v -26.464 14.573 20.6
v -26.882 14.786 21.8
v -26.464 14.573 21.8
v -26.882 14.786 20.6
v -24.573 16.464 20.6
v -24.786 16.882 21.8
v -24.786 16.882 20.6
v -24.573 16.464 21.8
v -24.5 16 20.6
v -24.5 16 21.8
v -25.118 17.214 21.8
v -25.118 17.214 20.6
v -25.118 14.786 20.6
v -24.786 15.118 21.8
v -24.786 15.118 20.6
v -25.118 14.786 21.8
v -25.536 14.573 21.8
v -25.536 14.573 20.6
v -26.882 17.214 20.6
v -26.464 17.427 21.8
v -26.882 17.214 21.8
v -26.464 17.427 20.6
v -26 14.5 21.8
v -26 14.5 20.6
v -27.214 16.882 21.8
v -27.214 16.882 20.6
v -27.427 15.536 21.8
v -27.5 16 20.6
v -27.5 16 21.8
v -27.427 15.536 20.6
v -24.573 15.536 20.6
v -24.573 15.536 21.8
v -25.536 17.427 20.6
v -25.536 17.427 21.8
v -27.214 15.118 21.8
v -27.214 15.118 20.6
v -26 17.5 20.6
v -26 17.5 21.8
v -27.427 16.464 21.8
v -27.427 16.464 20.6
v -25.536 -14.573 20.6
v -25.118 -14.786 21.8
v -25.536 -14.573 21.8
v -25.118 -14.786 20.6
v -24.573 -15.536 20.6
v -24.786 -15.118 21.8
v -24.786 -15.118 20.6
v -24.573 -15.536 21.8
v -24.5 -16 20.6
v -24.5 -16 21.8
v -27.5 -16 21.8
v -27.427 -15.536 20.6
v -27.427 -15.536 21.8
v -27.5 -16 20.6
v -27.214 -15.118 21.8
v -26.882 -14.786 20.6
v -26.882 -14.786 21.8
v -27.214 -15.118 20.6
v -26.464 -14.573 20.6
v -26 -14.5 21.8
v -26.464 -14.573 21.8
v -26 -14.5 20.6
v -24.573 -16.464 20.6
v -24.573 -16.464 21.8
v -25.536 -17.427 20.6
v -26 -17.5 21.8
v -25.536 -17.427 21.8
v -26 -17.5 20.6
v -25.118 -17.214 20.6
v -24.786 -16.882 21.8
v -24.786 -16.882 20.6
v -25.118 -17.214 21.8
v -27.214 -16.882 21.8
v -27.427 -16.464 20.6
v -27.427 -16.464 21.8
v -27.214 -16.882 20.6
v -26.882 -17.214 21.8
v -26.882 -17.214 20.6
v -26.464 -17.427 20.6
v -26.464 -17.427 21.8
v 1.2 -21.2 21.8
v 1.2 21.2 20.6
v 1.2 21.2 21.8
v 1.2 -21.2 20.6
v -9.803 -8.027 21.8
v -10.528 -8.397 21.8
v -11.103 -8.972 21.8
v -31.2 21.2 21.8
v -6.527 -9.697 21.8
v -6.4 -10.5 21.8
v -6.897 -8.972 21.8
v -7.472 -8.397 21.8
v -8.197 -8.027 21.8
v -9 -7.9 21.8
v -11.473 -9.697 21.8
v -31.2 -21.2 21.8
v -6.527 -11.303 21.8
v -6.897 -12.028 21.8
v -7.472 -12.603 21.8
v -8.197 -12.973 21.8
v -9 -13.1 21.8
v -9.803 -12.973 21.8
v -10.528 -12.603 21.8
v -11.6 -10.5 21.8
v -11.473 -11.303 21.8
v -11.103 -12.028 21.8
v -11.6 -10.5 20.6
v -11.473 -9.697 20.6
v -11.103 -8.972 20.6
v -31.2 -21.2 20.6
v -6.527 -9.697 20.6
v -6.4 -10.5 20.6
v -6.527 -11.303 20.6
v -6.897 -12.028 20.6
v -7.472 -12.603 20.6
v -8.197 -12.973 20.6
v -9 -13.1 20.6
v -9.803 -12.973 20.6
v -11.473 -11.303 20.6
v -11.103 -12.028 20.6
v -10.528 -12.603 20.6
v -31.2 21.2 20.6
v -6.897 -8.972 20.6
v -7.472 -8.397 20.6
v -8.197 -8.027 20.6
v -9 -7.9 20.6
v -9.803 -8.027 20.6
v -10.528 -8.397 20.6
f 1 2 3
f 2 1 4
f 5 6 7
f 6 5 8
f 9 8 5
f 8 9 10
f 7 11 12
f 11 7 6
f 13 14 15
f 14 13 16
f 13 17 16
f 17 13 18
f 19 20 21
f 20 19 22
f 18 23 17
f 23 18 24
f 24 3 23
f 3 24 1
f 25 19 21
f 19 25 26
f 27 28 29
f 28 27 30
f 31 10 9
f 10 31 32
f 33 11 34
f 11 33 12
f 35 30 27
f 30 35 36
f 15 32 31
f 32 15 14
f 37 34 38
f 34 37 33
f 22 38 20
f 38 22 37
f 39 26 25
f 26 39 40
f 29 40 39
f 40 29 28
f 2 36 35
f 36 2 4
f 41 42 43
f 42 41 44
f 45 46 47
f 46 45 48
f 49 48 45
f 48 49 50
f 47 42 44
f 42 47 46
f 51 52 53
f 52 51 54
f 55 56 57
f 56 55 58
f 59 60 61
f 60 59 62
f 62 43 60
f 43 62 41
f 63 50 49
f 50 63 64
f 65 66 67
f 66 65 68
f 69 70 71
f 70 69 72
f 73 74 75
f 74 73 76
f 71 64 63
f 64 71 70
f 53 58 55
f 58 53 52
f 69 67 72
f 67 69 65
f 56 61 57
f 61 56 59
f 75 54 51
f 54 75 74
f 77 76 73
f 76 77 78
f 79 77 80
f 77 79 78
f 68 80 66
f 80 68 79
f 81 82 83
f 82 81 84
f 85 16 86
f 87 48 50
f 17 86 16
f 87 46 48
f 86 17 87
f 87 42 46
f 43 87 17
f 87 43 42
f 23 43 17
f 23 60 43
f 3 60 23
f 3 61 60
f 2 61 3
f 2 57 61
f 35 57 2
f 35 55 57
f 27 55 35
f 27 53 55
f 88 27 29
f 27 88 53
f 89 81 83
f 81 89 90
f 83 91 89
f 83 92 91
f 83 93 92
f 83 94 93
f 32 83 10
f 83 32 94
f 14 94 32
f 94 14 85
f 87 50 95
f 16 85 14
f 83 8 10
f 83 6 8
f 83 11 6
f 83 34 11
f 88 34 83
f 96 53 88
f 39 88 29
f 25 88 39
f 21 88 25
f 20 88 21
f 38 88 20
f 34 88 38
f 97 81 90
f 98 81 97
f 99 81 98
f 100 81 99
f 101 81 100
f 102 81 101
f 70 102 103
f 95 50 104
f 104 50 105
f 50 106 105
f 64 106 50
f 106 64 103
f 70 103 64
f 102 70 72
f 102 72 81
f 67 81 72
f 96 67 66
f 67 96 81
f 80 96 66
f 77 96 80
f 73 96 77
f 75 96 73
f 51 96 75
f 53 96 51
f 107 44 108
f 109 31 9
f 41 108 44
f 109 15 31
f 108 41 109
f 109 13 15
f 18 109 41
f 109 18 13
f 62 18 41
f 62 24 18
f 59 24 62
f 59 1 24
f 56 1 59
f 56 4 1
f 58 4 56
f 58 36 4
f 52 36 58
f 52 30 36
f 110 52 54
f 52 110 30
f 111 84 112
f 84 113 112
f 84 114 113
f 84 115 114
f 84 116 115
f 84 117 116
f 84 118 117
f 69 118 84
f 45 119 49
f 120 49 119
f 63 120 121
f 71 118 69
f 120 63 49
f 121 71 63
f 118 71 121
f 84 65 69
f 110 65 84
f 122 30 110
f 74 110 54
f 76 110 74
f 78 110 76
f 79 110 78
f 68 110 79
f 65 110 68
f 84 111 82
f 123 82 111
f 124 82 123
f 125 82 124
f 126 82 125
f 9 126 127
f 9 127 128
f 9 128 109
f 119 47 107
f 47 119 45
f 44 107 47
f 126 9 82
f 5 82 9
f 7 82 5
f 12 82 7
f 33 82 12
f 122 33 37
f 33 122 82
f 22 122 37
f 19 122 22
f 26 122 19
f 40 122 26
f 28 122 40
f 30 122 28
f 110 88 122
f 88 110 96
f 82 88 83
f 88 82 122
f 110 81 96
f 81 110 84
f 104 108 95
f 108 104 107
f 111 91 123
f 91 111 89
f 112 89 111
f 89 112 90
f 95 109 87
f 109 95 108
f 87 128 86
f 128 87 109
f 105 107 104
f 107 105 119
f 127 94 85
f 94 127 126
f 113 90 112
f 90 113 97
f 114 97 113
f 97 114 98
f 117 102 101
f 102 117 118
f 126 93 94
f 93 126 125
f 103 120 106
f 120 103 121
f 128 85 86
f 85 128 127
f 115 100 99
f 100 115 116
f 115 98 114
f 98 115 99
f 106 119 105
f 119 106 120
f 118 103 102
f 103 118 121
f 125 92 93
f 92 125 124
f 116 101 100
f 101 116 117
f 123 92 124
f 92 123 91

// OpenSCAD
height = 40;
width = 40;
length = 60;
thick = 1.2;
$fn = 20;

module base()
{
    difference()
    {
        cube([length + 2*thick, width + 2*thick, height + thick], center = true);
        
        translate([0, 0, thick * 0.51])
        cube([length, width, height], center = true);
        
        translate([length/2, 0, height/2])
        cube([5, width, 2], center = true);
    }
    
    translate([-length/2 + 4, width/2 -4, height/2])
    cube([8, 8, thick], center = true);

    translate([-length/2 + 4, -width/2 +4, height/2])
    cube([8, 8, thick], center = true);

    translate([0, 8.2, 12])
    difference()
    {   
        cube([23 + 2*thick, 23 + thick, 15 + thick], center = true);
        
        translate([0, -thick * 0.51, thick * 0.51])
        {
            cube([23, 23, 15], center = true);
            
            translate([23/2, 23/2 - 3/2 - 16, thick * 0.51])
            cube([5, 3, 15], center = true);
            
            translate([-23/2, 23/2 - 3/2 - 16, thick * 0.51])
            cube([5, 3, 15], center = true);
            
            /*
            translate([0, 23/2 - 5/2 - 27, 0])
            #cube([10, 5, 10], center = true);
            
            translate([-8, 23/2 - 5/2 - 27, 0])
            #cube([8, 5, 10], center = true);
            */
        }
    }
}

module mobile()
{
    translate([length / 4, 0, height / 2 + thick])
    {
        cube([length / 2 + 2*thick, width + 2*thick, thick], center = true);
        
        translate([length / 4 - 7, (width + thick)/ 2 - thick - 0.2, -4])
        cube([8, thick, 8], center = true);
        
        translate([length / 4 - 7, -(width + thick)/ 2 +thick + 0.2, -4])
        cube([8, thick, 8], center = true);
    }
}

module top()
{
    translate([- length / 4, 0, height / 2 + thick])
    cube([length / 2 + 2*thick, width + 2*thick, thick], center = true);
} 

module upperScrews()
{
    translate([-length/2 + 4, width/2 -4, height/2])
    cylinder(d = 3, h = 5, center = true);
    
    translate([-length/2 + 4, -width/2 +4, height/2])
    cylinder(d = 3, h = 5, center = true);
}

module sideScrews()
{
    translate([length/2 -7,  0, height/2 - 3])
    rotate([90, 0, 0])
    cylinder(d = 4, h = width * 1.2, center = true);
}

module Base()
{
    difference()
    {
        base();
        upperScrews();
        sideScrews();
    }
}

module Mobile()
{
    difference()
    {
        mobile();
        sideScrews();
    }
}

module Top()
{
    difference()
    {
        top();
        upperScrews();
        translate([-9, -10.5, height/2])
        cylinder(d = 5.2, h = 5, center = true); 
    }
}

//Base();
//Mobile();
Top();
